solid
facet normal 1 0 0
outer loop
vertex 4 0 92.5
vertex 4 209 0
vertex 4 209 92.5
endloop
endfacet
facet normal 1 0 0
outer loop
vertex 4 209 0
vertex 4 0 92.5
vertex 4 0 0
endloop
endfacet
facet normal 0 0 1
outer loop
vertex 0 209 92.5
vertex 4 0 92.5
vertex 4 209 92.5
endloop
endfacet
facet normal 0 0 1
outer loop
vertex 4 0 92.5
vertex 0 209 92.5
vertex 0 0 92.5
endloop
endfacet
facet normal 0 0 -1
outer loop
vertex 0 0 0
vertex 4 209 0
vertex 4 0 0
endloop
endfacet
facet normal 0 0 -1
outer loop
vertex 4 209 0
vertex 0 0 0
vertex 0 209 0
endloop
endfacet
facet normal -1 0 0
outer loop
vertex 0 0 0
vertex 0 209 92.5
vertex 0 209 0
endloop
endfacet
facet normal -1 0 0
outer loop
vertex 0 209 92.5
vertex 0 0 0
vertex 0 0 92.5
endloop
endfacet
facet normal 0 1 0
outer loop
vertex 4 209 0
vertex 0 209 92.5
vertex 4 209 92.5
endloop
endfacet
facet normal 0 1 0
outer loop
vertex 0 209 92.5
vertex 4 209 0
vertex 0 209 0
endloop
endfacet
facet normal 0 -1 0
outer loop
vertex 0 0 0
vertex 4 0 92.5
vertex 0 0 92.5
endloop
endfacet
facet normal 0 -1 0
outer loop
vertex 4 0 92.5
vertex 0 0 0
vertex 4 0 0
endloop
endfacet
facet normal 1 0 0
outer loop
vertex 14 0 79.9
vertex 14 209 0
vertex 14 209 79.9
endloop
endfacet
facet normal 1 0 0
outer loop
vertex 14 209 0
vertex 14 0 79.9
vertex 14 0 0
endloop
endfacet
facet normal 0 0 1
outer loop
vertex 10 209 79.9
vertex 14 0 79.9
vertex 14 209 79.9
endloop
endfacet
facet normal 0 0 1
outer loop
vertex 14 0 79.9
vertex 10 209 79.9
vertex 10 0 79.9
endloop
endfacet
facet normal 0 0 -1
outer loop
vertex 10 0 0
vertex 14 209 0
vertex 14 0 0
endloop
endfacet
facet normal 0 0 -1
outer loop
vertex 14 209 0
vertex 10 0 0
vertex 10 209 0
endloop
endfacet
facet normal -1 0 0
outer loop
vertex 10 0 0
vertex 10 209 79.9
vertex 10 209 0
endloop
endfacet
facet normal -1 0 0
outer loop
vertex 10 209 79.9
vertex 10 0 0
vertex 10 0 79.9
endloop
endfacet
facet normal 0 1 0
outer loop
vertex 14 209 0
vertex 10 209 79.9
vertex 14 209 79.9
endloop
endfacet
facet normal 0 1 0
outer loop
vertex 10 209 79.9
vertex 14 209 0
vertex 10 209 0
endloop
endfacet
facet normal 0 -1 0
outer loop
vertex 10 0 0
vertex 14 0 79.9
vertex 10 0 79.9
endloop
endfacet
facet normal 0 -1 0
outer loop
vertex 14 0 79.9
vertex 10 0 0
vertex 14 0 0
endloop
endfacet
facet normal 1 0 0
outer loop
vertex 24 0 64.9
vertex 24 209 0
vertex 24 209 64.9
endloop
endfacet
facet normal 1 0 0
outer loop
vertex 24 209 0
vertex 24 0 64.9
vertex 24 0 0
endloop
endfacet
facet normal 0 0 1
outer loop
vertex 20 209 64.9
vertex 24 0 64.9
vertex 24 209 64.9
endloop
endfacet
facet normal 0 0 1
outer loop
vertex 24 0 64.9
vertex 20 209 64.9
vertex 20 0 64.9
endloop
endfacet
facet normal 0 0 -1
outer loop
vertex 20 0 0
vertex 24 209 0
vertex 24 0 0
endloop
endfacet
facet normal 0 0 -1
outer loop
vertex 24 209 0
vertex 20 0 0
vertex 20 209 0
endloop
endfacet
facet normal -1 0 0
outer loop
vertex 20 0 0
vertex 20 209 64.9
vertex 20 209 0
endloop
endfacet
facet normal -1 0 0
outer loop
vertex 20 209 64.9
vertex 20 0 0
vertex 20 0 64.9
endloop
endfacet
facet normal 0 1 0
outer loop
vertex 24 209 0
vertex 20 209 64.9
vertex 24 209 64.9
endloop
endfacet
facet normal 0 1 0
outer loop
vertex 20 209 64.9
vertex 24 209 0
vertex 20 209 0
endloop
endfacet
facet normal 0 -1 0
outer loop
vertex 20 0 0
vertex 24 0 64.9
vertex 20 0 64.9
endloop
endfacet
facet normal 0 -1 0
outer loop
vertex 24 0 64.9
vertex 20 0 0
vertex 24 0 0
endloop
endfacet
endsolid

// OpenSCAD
// file: defs.scad
w=210;
t1=10;
t3=20;
t=5;
a1=92.5;
a2=79.9;
a3=64.9;
b1=a1/2;
b2=a2;
b3=2*a3;
// main file
include <defs.scad>

cube([t-1, w-1, a1]);
translate([t+5,0,0]) cube([t-1, w-1, a2]);
translate([(t+5)*2,0,0]) cube([t-1, w-1, a3]);
